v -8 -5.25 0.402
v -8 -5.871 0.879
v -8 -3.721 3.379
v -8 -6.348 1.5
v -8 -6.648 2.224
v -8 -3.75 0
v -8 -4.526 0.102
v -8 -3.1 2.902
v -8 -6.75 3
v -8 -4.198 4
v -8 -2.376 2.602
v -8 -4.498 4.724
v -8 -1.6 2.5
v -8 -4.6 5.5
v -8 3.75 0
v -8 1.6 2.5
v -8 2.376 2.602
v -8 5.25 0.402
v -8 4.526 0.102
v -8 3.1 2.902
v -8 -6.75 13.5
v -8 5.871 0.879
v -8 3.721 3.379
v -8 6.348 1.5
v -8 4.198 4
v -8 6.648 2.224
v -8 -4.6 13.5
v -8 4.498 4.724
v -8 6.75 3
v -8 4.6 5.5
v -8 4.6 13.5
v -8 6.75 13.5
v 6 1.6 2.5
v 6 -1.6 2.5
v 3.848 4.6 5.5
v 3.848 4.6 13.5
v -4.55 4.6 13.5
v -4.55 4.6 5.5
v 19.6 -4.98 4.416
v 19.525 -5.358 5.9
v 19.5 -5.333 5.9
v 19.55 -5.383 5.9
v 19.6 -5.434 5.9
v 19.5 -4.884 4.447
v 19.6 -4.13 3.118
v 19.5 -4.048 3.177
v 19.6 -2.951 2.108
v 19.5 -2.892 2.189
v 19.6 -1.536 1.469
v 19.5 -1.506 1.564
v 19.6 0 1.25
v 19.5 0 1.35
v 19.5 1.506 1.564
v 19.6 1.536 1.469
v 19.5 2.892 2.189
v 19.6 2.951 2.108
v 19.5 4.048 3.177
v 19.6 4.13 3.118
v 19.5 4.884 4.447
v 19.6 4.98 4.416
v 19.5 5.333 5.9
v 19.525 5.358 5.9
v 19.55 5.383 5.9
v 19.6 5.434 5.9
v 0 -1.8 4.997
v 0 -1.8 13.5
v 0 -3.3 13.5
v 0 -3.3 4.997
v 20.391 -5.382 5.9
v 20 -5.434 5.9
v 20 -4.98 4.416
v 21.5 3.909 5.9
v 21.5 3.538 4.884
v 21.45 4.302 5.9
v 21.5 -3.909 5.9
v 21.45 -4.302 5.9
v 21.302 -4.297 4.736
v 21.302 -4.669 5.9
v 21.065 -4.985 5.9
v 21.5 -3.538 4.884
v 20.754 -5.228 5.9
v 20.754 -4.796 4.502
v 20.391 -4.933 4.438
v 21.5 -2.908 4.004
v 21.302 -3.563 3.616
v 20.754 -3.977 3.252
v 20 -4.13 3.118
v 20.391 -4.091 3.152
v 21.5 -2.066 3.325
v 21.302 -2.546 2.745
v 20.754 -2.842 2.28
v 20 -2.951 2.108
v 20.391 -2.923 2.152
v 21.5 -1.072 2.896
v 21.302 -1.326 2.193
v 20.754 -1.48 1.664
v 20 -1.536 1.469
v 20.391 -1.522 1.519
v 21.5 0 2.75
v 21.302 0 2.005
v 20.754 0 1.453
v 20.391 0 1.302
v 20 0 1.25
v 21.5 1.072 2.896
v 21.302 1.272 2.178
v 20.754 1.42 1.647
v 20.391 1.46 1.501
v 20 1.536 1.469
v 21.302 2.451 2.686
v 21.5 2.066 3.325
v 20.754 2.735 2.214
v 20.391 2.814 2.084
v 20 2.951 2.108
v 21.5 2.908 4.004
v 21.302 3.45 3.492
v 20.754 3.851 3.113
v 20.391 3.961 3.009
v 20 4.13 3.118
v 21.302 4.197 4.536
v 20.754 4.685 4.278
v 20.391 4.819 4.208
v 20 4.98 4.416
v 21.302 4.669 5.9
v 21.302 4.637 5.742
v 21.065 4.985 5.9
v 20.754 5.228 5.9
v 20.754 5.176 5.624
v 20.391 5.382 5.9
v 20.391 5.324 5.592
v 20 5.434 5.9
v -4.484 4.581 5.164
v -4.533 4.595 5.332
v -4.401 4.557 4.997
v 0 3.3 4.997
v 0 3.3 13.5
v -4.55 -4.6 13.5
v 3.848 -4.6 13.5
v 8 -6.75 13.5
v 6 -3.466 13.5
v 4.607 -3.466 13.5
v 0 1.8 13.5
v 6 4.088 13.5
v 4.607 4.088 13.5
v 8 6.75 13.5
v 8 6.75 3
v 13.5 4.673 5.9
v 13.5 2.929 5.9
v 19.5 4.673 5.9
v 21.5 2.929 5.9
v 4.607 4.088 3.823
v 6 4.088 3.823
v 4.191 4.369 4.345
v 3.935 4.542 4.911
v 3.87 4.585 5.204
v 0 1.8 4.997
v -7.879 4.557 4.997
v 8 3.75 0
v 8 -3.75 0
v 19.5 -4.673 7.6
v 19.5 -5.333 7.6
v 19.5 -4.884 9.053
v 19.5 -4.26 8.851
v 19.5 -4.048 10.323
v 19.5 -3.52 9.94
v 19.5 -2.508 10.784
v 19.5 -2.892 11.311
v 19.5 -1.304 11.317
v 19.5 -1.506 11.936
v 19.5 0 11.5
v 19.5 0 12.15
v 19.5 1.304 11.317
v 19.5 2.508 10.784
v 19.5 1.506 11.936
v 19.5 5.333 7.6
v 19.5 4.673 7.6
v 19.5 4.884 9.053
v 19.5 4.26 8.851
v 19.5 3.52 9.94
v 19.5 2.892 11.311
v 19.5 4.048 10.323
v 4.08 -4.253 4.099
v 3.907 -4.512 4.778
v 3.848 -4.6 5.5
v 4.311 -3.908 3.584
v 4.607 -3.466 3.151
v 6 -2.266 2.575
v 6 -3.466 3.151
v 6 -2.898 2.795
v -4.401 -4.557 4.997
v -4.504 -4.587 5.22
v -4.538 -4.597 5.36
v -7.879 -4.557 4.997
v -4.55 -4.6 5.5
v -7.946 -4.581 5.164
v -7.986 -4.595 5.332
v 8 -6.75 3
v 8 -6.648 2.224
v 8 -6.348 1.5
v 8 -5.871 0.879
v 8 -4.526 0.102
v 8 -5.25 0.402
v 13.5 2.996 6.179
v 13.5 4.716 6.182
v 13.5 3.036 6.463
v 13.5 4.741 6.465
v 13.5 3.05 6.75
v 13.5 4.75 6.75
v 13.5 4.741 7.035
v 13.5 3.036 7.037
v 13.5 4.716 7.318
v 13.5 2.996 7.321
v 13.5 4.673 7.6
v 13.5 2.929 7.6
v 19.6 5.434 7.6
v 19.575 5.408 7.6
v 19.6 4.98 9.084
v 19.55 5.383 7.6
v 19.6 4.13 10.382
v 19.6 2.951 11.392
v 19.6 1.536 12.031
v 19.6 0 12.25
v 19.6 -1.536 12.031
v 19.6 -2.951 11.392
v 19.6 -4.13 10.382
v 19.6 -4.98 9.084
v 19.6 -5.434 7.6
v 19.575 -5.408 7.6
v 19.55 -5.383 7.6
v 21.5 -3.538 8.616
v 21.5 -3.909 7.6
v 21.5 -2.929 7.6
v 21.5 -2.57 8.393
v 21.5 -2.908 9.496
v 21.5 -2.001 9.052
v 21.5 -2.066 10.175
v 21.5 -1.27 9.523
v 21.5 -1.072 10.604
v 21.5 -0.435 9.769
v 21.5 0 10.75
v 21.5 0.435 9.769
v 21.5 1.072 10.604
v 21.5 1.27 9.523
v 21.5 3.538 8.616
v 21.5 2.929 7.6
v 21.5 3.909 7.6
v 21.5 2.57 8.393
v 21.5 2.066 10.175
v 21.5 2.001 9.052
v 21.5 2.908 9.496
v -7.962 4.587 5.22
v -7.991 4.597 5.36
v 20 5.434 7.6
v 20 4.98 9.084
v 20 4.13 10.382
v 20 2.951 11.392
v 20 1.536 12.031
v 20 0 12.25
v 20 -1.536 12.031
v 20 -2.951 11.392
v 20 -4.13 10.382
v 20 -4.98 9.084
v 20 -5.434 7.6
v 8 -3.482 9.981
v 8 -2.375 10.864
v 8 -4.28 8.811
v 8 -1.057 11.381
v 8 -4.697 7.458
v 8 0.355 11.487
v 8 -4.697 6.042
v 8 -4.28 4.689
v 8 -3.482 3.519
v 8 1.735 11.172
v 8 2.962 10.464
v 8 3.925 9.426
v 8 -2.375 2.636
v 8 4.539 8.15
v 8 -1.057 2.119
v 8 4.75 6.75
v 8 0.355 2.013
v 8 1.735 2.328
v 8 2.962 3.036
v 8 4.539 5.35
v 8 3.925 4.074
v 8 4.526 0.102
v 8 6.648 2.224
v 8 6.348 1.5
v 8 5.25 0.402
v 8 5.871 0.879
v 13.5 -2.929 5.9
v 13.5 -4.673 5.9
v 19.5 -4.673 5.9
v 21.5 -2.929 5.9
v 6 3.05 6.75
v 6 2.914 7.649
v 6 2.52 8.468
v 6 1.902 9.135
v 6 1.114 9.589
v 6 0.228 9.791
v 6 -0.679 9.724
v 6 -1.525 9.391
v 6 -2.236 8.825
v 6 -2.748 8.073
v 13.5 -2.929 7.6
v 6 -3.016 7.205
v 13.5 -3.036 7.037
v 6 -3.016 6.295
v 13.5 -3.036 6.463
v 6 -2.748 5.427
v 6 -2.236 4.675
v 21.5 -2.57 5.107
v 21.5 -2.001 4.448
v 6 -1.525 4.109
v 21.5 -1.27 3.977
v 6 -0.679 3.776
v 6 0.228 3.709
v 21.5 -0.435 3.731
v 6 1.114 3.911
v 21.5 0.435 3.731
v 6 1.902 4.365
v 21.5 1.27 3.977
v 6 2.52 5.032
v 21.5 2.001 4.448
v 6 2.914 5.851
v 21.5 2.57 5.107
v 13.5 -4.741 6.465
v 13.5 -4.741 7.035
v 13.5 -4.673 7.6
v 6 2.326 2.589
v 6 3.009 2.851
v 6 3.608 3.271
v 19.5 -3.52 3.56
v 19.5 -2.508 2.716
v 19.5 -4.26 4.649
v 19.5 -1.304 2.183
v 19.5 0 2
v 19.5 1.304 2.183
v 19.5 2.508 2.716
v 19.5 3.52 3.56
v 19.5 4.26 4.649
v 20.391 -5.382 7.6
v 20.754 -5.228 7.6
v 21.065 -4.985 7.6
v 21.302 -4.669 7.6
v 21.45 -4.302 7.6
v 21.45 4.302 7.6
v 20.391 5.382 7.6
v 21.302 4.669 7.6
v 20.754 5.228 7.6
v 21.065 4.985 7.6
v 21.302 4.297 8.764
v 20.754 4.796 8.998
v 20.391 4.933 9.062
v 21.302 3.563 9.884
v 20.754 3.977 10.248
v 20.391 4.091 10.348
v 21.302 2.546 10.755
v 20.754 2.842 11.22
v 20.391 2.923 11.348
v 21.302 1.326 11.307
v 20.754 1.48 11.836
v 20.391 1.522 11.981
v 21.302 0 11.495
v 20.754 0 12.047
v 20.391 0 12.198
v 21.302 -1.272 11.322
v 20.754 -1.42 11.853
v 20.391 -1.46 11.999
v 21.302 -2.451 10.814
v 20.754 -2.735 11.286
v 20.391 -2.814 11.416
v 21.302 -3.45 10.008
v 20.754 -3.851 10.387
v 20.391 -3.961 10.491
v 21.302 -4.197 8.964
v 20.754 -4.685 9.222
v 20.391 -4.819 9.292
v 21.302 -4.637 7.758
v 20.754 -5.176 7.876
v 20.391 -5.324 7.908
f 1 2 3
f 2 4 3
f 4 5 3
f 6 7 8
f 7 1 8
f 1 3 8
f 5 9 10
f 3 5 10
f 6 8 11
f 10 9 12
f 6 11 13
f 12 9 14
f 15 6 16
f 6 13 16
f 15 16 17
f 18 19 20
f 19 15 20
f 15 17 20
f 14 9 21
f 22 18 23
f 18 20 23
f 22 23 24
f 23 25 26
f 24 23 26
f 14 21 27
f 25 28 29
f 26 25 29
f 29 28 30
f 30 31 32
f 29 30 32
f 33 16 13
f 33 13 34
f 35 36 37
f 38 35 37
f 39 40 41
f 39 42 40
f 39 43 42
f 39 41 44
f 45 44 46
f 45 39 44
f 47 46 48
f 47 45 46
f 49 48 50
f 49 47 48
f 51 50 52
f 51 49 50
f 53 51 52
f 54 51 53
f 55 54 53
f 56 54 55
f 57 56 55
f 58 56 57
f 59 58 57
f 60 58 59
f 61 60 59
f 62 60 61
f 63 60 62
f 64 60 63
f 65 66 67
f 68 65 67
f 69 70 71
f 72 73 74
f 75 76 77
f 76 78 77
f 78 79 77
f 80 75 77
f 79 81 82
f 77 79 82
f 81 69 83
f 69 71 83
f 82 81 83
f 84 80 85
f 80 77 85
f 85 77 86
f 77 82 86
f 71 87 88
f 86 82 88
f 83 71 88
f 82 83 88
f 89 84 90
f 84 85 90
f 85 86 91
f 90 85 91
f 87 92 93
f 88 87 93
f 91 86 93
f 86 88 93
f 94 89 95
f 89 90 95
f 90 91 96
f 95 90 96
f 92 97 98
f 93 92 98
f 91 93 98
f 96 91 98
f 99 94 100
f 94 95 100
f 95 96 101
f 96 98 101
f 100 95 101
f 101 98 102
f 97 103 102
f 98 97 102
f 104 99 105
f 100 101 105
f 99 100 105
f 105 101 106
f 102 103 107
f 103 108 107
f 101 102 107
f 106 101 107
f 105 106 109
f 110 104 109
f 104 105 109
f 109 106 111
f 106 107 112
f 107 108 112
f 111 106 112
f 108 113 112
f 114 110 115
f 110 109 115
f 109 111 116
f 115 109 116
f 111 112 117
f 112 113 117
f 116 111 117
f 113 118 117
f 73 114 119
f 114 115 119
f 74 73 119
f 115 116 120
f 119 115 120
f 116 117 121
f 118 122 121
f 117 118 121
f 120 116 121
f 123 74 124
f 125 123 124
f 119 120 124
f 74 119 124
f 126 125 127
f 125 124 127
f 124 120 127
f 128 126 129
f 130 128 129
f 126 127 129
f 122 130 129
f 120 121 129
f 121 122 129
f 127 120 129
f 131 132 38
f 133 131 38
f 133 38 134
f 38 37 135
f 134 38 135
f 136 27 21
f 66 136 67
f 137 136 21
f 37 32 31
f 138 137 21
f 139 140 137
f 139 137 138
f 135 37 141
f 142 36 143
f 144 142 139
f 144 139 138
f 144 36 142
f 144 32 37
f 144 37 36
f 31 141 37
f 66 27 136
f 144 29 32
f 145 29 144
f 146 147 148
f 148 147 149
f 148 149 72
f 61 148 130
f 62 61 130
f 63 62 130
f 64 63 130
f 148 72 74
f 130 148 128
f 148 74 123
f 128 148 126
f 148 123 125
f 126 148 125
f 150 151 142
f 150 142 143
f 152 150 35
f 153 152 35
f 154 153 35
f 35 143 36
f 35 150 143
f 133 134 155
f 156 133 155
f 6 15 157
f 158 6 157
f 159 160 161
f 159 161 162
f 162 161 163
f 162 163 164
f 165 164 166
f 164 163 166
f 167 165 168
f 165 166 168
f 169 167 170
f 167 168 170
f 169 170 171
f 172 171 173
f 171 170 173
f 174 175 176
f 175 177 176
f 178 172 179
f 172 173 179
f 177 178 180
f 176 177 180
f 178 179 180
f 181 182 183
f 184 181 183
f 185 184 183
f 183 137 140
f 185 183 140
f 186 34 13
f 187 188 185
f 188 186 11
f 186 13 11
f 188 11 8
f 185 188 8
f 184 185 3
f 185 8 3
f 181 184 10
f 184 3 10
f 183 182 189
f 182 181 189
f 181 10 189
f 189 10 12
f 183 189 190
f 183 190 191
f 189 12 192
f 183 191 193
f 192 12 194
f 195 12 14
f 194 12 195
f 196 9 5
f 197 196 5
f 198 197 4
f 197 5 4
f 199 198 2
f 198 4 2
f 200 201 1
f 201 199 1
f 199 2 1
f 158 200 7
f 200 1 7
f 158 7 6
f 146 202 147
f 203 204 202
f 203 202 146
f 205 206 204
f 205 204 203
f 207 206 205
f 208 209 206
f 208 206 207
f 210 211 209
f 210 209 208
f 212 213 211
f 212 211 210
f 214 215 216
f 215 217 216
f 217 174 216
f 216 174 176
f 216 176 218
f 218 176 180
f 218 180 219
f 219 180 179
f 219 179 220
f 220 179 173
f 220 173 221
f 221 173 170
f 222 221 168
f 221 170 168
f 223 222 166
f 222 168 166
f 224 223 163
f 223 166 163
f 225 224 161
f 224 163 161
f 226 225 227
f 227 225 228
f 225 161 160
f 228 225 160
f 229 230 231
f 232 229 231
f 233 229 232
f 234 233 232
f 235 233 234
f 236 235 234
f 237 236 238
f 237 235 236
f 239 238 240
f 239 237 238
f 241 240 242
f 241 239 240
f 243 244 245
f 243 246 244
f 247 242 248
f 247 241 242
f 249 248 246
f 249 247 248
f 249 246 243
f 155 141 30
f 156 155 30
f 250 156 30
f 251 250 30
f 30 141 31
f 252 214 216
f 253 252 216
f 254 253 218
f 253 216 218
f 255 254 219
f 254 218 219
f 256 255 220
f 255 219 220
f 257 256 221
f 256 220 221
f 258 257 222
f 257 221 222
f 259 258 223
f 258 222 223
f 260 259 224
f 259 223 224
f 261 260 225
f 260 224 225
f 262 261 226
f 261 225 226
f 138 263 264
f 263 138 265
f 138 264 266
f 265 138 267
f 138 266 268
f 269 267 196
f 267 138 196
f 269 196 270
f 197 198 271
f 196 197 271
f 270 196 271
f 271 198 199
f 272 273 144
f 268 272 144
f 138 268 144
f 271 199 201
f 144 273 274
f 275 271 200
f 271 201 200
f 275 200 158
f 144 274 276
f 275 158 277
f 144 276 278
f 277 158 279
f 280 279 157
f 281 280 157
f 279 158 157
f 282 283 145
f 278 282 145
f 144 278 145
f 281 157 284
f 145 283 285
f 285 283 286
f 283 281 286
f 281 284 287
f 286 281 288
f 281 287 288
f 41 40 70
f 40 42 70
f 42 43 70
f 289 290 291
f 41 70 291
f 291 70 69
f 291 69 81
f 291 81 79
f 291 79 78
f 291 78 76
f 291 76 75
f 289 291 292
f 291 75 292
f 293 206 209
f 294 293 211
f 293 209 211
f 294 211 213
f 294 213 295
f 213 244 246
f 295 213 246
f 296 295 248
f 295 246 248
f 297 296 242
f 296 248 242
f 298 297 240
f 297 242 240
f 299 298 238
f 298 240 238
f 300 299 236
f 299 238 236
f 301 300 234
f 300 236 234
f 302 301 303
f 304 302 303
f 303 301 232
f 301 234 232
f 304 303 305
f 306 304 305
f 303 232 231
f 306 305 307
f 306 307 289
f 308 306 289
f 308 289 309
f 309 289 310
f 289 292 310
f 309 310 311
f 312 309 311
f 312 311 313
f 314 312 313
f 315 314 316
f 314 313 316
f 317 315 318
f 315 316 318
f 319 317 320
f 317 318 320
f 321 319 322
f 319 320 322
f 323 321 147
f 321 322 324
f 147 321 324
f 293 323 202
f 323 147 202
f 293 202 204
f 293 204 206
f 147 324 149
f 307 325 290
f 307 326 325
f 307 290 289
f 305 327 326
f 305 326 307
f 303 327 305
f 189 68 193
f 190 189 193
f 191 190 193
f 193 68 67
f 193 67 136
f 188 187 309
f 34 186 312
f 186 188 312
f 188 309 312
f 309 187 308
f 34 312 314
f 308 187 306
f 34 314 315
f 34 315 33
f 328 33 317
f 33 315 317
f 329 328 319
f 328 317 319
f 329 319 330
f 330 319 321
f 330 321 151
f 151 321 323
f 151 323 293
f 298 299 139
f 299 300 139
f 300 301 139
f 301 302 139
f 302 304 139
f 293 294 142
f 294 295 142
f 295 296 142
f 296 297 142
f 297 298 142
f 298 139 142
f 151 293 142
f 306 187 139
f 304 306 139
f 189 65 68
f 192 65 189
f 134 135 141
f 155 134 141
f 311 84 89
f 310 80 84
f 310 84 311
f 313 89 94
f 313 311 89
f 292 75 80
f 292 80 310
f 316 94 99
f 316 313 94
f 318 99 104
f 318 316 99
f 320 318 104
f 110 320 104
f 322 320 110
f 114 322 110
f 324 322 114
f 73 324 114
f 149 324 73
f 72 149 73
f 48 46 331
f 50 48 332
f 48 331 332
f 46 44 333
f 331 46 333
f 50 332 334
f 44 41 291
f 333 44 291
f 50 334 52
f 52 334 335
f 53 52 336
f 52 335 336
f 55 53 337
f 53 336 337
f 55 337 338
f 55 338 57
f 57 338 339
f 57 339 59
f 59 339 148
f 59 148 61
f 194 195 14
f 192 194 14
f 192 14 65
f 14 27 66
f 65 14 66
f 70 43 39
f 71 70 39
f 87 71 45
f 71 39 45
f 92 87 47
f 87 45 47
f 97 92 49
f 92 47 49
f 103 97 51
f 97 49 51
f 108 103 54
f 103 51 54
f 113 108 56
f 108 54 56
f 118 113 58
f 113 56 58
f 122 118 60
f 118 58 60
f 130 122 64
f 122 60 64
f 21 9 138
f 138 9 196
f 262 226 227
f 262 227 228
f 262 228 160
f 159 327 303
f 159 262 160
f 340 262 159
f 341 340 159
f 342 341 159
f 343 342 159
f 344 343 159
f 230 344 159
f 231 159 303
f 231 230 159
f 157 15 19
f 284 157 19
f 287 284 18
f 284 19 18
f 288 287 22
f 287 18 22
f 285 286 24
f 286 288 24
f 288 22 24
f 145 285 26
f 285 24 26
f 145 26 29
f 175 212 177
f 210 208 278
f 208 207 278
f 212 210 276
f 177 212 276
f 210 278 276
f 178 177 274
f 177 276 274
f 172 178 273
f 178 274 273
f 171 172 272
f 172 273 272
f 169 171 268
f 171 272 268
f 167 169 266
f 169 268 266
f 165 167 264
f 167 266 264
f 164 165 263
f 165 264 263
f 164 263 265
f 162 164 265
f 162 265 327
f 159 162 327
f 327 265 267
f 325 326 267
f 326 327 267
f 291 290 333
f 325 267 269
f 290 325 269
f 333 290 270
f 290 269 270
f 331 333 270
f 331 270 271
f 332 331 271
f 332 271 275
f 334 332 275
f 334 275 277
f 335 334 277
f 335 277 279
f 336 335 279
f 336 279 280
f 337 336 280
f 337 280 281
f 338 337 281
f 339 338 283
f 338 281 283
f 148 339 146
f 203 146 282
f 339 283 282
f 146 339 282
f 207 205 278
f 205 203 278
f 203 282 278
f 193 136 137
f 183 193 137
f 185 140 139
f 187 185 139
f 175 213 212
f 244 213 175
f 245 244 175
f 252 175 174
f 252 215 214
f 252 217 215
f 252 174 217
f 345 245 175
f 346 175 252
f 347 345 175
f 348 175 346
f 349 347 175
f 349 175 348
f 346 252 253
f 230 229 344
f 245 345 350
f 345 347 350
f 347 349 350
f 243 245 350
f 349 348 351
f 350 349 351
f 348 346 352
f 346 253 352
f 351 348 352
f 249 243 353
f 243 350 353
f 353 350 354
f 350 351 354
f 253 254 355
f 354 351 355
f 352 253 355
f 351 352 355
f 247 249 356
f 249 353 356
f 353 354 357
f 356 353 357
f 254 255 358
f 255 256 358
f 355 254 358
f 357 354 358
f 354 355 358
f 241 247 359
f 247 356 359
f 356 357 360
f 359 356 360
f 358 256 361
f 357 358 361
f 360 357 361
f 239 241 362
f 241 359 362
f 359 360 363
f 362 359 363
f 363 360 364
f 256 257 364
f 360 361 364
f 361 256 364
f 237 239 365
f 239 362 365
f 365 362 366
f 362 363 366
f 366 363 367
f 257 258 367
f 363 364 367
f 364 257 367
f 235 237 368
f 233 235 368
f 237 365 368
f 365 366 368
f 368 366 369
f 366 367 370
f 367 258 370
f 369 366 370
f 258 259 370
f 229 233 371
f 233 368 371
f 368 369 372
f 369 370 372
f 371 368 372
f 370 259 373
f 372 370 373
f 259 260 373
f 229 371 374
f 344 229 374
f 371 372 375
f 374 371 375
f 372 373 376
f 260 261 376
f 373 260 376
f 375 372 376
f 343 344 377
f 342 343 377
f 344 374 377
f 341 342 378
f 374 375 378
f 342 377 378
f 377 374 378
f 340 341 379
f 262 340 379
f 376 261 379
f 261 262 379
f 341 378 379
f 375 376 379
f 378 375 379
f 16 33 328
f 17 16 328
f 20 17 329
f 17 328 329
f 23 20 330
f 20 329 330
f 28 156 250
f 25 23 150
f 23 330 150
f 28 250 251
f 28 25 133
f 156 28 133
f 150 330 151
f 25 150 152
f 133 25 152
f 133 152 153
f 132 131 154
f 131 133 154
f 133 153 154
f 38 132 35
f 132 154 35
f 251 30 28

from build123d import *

# Parameters (mm, degrees)
F0_W          = 16
F0_H          = 13.5
F1_DEPTH      = 13.5
F2_R          = 4.75
F3_DEPTH      = 11.5
F4_R          = 5.5
F5_DEPTH      = 2
F7_DEPTH      = 11
F8_R          = 3.05
F9_DEPTH      = 17
F10_W         = 9.2
F10_H         = 2.4967868254
F11_DEPTH     = 10
F12_W         = 12.1366479748
F12_H         = 1.7
F13_DEPTH     = 8
F14_T4_DEPTH  = 19.347977845
F14_T9_DEPTH  = 19.347977845
F14_T11_DEPTH = 31
F15_R         = 1.5
F16_SIZE      = 0.1


# Not quite as in the source:
# - a fillet or chamfer that OpenCascade refuses, or shapes differently, is made with other operations: its cross-section is extruded or revolved along the edge and cut away or added


with BuildPart() as f1:
    # F0 (on Top) → F1 (new body)
    with BuildSketch(Plane.XY):
        Rectangle(F0_W, F0_H)
    extrude(amount=F1_DEPTH)

    # F2 (on face) → F3 (join)
    with BuildSketch(Plane.YZ.offset(8)):
        with Locations((0, 6.75)):
            Circle(F2_R)
    extrude(amount=F3_DEPTH)

    # F4 (on face) → F5 (join)
    with BuildSketch(Plane.YZ.offset(19.5)):
        with Locations((0, 6.75)):
            Circle(F4_R)
    extrude(amount=F5_DEPTH)

    # F6 (on face) → F7 (cut)
    with BuildSketch(Plane.XY.offset(13.5)):
        Polygon((0, 3.3), (0, 1.8), (-8, 4.6), (-8, -4.6), (0, -1.8), (0, -3.3), (-4.5499948867, -4.6), (3.847977845, -4.6), (4.6067554504, -3.4655697951), (6, -3.4655697951), (6, 4.0877170554), (4.6067554504, 4.0877170554), (3.847977845, 4.6), (-4.5499948867, 4.6), align=None)
    extrude(amount=-F7_DEPTH, mode=Mode.SUBTRACT)

    # F8 (on face) → F9 (cut)
    with BuildSketch(Plane.YZ.offset(21.5)):
        with Locations((0, 6.75)):
            Circle(F8_R)
    extrude(amount=-F9_DEPTH, mode=Mode.SUBTRACT)

    # F10 (on face) → F11 (cut)
    with BuildSketch(Plane(origin=(-8, 0, 0), x_dir=(0, -1, 0), z_dir=(-1, 0, 0))):
        with Locations((0, 3.7483934127)):
            Rectangle(F10_W, F10_H)
    extrude(amount=-F11_DEPTH, mode=Mode.SUBTRACT)

    # F12 (on face) → F13 (cut)
    with BuildSketch(Plane.YZ.offset(21.5)):
        with Locations((0, 6.75)):
            Rectangle(F12_W, F12_H)
    extrude(amount=-F13_DEPTH, mode=Mode.SUBTRACT)

    # F14: fillet of radius 3 on 4 edges, made by hand


with BuildPart() as f14_tool2:
    # F14_s3 → F14_t4 (new body)
    with BuildSketch(Plane.YZ.offset(11.347977845)):
        with BuildLine():
            ThreePointArc((1.6, 2.5), (3.7213203436, 3.3786796564), (4.6, 5.5))
            Line((4.6, 5.5), (4.6, 2.5))
            Line((4.6, 2.5), (1.6, 2.5))
        make_face()
    extrude(amount=-F14_T4_DEPTH)

    split(bisect_by=Plane.YZ.offset(6), keep=Keep.BOTTOM)


with BuildPart() as f1_1:
    add(f1.part)

    # F14_t1: union F14_tool2
    add(f14_tool2.part)


with BuildPart() as f14_tool7:
    # F14_s8 → F14_t9 (new body)
    with BuildSketch(Plane.YZ.offset(-8)):
        with BuildLine():
            ThreePointArc((-1.6, 2.5), (-3.7213203436, 3.3786796564), (-4.6, 5.5))
            Line((-4.6, 5.5), (-4.6, 2.5))
            Line((-4.6, 2.5), (-1.6, 2.5))
        make_face()
    extrude(amount=F14_T9_DEPTH)

    split(bisect_by=Plane.YZ.offset(6), keep=Keep.BOTTOM)


with BuildPart() as f1_2:
    add(f1_1.part)

    # F14_t6: union F14_tool7
    add(f14_tool7.part)

    # F14_s12 → F14_t11 (cut)
    with BuildSketch(Plane.YZ.offset(-15.5)):
        with BuildLine():
            ThreePointArc((3.75, 0), (5.8713203436, 0.8786796564), (6.75, 3))
            Line((6.75, 3), (6.75, 0))
            Line((6.75, 0), (3.75, 0))
        make_face()
        with BuildLine():
            ThreePointArc((-6.75, 3), (-5.8713203436, 0.8786796564), (-3.75, 0))
            Line((-3.75, 0), (-6.75, 0))
            Line((-6.75, 0), (-6.75, 3))
        make_face()
    extrude(amount=F14_T11_DEPTH, mode=Mode.SUBTRACT)

    # F15
    f15_edges = [f1_2.edges().sort_by_distance(p)[0] for p in [
        (21.5, 0, 12.25),
        (21.5, 0, 1.25),
    ]]
    fillet(f15_edges, radius=F15_R)

    # F16
    f16_edges = [f1_2.edges().sort_by_distance(p)[0] for p in [
        (19.5, 0, 1.25),
        (19.5, 0, 12.25),
    ]]
    chamfer(f16_edges, length=F16_SIZE)


solid = f1_2.part
